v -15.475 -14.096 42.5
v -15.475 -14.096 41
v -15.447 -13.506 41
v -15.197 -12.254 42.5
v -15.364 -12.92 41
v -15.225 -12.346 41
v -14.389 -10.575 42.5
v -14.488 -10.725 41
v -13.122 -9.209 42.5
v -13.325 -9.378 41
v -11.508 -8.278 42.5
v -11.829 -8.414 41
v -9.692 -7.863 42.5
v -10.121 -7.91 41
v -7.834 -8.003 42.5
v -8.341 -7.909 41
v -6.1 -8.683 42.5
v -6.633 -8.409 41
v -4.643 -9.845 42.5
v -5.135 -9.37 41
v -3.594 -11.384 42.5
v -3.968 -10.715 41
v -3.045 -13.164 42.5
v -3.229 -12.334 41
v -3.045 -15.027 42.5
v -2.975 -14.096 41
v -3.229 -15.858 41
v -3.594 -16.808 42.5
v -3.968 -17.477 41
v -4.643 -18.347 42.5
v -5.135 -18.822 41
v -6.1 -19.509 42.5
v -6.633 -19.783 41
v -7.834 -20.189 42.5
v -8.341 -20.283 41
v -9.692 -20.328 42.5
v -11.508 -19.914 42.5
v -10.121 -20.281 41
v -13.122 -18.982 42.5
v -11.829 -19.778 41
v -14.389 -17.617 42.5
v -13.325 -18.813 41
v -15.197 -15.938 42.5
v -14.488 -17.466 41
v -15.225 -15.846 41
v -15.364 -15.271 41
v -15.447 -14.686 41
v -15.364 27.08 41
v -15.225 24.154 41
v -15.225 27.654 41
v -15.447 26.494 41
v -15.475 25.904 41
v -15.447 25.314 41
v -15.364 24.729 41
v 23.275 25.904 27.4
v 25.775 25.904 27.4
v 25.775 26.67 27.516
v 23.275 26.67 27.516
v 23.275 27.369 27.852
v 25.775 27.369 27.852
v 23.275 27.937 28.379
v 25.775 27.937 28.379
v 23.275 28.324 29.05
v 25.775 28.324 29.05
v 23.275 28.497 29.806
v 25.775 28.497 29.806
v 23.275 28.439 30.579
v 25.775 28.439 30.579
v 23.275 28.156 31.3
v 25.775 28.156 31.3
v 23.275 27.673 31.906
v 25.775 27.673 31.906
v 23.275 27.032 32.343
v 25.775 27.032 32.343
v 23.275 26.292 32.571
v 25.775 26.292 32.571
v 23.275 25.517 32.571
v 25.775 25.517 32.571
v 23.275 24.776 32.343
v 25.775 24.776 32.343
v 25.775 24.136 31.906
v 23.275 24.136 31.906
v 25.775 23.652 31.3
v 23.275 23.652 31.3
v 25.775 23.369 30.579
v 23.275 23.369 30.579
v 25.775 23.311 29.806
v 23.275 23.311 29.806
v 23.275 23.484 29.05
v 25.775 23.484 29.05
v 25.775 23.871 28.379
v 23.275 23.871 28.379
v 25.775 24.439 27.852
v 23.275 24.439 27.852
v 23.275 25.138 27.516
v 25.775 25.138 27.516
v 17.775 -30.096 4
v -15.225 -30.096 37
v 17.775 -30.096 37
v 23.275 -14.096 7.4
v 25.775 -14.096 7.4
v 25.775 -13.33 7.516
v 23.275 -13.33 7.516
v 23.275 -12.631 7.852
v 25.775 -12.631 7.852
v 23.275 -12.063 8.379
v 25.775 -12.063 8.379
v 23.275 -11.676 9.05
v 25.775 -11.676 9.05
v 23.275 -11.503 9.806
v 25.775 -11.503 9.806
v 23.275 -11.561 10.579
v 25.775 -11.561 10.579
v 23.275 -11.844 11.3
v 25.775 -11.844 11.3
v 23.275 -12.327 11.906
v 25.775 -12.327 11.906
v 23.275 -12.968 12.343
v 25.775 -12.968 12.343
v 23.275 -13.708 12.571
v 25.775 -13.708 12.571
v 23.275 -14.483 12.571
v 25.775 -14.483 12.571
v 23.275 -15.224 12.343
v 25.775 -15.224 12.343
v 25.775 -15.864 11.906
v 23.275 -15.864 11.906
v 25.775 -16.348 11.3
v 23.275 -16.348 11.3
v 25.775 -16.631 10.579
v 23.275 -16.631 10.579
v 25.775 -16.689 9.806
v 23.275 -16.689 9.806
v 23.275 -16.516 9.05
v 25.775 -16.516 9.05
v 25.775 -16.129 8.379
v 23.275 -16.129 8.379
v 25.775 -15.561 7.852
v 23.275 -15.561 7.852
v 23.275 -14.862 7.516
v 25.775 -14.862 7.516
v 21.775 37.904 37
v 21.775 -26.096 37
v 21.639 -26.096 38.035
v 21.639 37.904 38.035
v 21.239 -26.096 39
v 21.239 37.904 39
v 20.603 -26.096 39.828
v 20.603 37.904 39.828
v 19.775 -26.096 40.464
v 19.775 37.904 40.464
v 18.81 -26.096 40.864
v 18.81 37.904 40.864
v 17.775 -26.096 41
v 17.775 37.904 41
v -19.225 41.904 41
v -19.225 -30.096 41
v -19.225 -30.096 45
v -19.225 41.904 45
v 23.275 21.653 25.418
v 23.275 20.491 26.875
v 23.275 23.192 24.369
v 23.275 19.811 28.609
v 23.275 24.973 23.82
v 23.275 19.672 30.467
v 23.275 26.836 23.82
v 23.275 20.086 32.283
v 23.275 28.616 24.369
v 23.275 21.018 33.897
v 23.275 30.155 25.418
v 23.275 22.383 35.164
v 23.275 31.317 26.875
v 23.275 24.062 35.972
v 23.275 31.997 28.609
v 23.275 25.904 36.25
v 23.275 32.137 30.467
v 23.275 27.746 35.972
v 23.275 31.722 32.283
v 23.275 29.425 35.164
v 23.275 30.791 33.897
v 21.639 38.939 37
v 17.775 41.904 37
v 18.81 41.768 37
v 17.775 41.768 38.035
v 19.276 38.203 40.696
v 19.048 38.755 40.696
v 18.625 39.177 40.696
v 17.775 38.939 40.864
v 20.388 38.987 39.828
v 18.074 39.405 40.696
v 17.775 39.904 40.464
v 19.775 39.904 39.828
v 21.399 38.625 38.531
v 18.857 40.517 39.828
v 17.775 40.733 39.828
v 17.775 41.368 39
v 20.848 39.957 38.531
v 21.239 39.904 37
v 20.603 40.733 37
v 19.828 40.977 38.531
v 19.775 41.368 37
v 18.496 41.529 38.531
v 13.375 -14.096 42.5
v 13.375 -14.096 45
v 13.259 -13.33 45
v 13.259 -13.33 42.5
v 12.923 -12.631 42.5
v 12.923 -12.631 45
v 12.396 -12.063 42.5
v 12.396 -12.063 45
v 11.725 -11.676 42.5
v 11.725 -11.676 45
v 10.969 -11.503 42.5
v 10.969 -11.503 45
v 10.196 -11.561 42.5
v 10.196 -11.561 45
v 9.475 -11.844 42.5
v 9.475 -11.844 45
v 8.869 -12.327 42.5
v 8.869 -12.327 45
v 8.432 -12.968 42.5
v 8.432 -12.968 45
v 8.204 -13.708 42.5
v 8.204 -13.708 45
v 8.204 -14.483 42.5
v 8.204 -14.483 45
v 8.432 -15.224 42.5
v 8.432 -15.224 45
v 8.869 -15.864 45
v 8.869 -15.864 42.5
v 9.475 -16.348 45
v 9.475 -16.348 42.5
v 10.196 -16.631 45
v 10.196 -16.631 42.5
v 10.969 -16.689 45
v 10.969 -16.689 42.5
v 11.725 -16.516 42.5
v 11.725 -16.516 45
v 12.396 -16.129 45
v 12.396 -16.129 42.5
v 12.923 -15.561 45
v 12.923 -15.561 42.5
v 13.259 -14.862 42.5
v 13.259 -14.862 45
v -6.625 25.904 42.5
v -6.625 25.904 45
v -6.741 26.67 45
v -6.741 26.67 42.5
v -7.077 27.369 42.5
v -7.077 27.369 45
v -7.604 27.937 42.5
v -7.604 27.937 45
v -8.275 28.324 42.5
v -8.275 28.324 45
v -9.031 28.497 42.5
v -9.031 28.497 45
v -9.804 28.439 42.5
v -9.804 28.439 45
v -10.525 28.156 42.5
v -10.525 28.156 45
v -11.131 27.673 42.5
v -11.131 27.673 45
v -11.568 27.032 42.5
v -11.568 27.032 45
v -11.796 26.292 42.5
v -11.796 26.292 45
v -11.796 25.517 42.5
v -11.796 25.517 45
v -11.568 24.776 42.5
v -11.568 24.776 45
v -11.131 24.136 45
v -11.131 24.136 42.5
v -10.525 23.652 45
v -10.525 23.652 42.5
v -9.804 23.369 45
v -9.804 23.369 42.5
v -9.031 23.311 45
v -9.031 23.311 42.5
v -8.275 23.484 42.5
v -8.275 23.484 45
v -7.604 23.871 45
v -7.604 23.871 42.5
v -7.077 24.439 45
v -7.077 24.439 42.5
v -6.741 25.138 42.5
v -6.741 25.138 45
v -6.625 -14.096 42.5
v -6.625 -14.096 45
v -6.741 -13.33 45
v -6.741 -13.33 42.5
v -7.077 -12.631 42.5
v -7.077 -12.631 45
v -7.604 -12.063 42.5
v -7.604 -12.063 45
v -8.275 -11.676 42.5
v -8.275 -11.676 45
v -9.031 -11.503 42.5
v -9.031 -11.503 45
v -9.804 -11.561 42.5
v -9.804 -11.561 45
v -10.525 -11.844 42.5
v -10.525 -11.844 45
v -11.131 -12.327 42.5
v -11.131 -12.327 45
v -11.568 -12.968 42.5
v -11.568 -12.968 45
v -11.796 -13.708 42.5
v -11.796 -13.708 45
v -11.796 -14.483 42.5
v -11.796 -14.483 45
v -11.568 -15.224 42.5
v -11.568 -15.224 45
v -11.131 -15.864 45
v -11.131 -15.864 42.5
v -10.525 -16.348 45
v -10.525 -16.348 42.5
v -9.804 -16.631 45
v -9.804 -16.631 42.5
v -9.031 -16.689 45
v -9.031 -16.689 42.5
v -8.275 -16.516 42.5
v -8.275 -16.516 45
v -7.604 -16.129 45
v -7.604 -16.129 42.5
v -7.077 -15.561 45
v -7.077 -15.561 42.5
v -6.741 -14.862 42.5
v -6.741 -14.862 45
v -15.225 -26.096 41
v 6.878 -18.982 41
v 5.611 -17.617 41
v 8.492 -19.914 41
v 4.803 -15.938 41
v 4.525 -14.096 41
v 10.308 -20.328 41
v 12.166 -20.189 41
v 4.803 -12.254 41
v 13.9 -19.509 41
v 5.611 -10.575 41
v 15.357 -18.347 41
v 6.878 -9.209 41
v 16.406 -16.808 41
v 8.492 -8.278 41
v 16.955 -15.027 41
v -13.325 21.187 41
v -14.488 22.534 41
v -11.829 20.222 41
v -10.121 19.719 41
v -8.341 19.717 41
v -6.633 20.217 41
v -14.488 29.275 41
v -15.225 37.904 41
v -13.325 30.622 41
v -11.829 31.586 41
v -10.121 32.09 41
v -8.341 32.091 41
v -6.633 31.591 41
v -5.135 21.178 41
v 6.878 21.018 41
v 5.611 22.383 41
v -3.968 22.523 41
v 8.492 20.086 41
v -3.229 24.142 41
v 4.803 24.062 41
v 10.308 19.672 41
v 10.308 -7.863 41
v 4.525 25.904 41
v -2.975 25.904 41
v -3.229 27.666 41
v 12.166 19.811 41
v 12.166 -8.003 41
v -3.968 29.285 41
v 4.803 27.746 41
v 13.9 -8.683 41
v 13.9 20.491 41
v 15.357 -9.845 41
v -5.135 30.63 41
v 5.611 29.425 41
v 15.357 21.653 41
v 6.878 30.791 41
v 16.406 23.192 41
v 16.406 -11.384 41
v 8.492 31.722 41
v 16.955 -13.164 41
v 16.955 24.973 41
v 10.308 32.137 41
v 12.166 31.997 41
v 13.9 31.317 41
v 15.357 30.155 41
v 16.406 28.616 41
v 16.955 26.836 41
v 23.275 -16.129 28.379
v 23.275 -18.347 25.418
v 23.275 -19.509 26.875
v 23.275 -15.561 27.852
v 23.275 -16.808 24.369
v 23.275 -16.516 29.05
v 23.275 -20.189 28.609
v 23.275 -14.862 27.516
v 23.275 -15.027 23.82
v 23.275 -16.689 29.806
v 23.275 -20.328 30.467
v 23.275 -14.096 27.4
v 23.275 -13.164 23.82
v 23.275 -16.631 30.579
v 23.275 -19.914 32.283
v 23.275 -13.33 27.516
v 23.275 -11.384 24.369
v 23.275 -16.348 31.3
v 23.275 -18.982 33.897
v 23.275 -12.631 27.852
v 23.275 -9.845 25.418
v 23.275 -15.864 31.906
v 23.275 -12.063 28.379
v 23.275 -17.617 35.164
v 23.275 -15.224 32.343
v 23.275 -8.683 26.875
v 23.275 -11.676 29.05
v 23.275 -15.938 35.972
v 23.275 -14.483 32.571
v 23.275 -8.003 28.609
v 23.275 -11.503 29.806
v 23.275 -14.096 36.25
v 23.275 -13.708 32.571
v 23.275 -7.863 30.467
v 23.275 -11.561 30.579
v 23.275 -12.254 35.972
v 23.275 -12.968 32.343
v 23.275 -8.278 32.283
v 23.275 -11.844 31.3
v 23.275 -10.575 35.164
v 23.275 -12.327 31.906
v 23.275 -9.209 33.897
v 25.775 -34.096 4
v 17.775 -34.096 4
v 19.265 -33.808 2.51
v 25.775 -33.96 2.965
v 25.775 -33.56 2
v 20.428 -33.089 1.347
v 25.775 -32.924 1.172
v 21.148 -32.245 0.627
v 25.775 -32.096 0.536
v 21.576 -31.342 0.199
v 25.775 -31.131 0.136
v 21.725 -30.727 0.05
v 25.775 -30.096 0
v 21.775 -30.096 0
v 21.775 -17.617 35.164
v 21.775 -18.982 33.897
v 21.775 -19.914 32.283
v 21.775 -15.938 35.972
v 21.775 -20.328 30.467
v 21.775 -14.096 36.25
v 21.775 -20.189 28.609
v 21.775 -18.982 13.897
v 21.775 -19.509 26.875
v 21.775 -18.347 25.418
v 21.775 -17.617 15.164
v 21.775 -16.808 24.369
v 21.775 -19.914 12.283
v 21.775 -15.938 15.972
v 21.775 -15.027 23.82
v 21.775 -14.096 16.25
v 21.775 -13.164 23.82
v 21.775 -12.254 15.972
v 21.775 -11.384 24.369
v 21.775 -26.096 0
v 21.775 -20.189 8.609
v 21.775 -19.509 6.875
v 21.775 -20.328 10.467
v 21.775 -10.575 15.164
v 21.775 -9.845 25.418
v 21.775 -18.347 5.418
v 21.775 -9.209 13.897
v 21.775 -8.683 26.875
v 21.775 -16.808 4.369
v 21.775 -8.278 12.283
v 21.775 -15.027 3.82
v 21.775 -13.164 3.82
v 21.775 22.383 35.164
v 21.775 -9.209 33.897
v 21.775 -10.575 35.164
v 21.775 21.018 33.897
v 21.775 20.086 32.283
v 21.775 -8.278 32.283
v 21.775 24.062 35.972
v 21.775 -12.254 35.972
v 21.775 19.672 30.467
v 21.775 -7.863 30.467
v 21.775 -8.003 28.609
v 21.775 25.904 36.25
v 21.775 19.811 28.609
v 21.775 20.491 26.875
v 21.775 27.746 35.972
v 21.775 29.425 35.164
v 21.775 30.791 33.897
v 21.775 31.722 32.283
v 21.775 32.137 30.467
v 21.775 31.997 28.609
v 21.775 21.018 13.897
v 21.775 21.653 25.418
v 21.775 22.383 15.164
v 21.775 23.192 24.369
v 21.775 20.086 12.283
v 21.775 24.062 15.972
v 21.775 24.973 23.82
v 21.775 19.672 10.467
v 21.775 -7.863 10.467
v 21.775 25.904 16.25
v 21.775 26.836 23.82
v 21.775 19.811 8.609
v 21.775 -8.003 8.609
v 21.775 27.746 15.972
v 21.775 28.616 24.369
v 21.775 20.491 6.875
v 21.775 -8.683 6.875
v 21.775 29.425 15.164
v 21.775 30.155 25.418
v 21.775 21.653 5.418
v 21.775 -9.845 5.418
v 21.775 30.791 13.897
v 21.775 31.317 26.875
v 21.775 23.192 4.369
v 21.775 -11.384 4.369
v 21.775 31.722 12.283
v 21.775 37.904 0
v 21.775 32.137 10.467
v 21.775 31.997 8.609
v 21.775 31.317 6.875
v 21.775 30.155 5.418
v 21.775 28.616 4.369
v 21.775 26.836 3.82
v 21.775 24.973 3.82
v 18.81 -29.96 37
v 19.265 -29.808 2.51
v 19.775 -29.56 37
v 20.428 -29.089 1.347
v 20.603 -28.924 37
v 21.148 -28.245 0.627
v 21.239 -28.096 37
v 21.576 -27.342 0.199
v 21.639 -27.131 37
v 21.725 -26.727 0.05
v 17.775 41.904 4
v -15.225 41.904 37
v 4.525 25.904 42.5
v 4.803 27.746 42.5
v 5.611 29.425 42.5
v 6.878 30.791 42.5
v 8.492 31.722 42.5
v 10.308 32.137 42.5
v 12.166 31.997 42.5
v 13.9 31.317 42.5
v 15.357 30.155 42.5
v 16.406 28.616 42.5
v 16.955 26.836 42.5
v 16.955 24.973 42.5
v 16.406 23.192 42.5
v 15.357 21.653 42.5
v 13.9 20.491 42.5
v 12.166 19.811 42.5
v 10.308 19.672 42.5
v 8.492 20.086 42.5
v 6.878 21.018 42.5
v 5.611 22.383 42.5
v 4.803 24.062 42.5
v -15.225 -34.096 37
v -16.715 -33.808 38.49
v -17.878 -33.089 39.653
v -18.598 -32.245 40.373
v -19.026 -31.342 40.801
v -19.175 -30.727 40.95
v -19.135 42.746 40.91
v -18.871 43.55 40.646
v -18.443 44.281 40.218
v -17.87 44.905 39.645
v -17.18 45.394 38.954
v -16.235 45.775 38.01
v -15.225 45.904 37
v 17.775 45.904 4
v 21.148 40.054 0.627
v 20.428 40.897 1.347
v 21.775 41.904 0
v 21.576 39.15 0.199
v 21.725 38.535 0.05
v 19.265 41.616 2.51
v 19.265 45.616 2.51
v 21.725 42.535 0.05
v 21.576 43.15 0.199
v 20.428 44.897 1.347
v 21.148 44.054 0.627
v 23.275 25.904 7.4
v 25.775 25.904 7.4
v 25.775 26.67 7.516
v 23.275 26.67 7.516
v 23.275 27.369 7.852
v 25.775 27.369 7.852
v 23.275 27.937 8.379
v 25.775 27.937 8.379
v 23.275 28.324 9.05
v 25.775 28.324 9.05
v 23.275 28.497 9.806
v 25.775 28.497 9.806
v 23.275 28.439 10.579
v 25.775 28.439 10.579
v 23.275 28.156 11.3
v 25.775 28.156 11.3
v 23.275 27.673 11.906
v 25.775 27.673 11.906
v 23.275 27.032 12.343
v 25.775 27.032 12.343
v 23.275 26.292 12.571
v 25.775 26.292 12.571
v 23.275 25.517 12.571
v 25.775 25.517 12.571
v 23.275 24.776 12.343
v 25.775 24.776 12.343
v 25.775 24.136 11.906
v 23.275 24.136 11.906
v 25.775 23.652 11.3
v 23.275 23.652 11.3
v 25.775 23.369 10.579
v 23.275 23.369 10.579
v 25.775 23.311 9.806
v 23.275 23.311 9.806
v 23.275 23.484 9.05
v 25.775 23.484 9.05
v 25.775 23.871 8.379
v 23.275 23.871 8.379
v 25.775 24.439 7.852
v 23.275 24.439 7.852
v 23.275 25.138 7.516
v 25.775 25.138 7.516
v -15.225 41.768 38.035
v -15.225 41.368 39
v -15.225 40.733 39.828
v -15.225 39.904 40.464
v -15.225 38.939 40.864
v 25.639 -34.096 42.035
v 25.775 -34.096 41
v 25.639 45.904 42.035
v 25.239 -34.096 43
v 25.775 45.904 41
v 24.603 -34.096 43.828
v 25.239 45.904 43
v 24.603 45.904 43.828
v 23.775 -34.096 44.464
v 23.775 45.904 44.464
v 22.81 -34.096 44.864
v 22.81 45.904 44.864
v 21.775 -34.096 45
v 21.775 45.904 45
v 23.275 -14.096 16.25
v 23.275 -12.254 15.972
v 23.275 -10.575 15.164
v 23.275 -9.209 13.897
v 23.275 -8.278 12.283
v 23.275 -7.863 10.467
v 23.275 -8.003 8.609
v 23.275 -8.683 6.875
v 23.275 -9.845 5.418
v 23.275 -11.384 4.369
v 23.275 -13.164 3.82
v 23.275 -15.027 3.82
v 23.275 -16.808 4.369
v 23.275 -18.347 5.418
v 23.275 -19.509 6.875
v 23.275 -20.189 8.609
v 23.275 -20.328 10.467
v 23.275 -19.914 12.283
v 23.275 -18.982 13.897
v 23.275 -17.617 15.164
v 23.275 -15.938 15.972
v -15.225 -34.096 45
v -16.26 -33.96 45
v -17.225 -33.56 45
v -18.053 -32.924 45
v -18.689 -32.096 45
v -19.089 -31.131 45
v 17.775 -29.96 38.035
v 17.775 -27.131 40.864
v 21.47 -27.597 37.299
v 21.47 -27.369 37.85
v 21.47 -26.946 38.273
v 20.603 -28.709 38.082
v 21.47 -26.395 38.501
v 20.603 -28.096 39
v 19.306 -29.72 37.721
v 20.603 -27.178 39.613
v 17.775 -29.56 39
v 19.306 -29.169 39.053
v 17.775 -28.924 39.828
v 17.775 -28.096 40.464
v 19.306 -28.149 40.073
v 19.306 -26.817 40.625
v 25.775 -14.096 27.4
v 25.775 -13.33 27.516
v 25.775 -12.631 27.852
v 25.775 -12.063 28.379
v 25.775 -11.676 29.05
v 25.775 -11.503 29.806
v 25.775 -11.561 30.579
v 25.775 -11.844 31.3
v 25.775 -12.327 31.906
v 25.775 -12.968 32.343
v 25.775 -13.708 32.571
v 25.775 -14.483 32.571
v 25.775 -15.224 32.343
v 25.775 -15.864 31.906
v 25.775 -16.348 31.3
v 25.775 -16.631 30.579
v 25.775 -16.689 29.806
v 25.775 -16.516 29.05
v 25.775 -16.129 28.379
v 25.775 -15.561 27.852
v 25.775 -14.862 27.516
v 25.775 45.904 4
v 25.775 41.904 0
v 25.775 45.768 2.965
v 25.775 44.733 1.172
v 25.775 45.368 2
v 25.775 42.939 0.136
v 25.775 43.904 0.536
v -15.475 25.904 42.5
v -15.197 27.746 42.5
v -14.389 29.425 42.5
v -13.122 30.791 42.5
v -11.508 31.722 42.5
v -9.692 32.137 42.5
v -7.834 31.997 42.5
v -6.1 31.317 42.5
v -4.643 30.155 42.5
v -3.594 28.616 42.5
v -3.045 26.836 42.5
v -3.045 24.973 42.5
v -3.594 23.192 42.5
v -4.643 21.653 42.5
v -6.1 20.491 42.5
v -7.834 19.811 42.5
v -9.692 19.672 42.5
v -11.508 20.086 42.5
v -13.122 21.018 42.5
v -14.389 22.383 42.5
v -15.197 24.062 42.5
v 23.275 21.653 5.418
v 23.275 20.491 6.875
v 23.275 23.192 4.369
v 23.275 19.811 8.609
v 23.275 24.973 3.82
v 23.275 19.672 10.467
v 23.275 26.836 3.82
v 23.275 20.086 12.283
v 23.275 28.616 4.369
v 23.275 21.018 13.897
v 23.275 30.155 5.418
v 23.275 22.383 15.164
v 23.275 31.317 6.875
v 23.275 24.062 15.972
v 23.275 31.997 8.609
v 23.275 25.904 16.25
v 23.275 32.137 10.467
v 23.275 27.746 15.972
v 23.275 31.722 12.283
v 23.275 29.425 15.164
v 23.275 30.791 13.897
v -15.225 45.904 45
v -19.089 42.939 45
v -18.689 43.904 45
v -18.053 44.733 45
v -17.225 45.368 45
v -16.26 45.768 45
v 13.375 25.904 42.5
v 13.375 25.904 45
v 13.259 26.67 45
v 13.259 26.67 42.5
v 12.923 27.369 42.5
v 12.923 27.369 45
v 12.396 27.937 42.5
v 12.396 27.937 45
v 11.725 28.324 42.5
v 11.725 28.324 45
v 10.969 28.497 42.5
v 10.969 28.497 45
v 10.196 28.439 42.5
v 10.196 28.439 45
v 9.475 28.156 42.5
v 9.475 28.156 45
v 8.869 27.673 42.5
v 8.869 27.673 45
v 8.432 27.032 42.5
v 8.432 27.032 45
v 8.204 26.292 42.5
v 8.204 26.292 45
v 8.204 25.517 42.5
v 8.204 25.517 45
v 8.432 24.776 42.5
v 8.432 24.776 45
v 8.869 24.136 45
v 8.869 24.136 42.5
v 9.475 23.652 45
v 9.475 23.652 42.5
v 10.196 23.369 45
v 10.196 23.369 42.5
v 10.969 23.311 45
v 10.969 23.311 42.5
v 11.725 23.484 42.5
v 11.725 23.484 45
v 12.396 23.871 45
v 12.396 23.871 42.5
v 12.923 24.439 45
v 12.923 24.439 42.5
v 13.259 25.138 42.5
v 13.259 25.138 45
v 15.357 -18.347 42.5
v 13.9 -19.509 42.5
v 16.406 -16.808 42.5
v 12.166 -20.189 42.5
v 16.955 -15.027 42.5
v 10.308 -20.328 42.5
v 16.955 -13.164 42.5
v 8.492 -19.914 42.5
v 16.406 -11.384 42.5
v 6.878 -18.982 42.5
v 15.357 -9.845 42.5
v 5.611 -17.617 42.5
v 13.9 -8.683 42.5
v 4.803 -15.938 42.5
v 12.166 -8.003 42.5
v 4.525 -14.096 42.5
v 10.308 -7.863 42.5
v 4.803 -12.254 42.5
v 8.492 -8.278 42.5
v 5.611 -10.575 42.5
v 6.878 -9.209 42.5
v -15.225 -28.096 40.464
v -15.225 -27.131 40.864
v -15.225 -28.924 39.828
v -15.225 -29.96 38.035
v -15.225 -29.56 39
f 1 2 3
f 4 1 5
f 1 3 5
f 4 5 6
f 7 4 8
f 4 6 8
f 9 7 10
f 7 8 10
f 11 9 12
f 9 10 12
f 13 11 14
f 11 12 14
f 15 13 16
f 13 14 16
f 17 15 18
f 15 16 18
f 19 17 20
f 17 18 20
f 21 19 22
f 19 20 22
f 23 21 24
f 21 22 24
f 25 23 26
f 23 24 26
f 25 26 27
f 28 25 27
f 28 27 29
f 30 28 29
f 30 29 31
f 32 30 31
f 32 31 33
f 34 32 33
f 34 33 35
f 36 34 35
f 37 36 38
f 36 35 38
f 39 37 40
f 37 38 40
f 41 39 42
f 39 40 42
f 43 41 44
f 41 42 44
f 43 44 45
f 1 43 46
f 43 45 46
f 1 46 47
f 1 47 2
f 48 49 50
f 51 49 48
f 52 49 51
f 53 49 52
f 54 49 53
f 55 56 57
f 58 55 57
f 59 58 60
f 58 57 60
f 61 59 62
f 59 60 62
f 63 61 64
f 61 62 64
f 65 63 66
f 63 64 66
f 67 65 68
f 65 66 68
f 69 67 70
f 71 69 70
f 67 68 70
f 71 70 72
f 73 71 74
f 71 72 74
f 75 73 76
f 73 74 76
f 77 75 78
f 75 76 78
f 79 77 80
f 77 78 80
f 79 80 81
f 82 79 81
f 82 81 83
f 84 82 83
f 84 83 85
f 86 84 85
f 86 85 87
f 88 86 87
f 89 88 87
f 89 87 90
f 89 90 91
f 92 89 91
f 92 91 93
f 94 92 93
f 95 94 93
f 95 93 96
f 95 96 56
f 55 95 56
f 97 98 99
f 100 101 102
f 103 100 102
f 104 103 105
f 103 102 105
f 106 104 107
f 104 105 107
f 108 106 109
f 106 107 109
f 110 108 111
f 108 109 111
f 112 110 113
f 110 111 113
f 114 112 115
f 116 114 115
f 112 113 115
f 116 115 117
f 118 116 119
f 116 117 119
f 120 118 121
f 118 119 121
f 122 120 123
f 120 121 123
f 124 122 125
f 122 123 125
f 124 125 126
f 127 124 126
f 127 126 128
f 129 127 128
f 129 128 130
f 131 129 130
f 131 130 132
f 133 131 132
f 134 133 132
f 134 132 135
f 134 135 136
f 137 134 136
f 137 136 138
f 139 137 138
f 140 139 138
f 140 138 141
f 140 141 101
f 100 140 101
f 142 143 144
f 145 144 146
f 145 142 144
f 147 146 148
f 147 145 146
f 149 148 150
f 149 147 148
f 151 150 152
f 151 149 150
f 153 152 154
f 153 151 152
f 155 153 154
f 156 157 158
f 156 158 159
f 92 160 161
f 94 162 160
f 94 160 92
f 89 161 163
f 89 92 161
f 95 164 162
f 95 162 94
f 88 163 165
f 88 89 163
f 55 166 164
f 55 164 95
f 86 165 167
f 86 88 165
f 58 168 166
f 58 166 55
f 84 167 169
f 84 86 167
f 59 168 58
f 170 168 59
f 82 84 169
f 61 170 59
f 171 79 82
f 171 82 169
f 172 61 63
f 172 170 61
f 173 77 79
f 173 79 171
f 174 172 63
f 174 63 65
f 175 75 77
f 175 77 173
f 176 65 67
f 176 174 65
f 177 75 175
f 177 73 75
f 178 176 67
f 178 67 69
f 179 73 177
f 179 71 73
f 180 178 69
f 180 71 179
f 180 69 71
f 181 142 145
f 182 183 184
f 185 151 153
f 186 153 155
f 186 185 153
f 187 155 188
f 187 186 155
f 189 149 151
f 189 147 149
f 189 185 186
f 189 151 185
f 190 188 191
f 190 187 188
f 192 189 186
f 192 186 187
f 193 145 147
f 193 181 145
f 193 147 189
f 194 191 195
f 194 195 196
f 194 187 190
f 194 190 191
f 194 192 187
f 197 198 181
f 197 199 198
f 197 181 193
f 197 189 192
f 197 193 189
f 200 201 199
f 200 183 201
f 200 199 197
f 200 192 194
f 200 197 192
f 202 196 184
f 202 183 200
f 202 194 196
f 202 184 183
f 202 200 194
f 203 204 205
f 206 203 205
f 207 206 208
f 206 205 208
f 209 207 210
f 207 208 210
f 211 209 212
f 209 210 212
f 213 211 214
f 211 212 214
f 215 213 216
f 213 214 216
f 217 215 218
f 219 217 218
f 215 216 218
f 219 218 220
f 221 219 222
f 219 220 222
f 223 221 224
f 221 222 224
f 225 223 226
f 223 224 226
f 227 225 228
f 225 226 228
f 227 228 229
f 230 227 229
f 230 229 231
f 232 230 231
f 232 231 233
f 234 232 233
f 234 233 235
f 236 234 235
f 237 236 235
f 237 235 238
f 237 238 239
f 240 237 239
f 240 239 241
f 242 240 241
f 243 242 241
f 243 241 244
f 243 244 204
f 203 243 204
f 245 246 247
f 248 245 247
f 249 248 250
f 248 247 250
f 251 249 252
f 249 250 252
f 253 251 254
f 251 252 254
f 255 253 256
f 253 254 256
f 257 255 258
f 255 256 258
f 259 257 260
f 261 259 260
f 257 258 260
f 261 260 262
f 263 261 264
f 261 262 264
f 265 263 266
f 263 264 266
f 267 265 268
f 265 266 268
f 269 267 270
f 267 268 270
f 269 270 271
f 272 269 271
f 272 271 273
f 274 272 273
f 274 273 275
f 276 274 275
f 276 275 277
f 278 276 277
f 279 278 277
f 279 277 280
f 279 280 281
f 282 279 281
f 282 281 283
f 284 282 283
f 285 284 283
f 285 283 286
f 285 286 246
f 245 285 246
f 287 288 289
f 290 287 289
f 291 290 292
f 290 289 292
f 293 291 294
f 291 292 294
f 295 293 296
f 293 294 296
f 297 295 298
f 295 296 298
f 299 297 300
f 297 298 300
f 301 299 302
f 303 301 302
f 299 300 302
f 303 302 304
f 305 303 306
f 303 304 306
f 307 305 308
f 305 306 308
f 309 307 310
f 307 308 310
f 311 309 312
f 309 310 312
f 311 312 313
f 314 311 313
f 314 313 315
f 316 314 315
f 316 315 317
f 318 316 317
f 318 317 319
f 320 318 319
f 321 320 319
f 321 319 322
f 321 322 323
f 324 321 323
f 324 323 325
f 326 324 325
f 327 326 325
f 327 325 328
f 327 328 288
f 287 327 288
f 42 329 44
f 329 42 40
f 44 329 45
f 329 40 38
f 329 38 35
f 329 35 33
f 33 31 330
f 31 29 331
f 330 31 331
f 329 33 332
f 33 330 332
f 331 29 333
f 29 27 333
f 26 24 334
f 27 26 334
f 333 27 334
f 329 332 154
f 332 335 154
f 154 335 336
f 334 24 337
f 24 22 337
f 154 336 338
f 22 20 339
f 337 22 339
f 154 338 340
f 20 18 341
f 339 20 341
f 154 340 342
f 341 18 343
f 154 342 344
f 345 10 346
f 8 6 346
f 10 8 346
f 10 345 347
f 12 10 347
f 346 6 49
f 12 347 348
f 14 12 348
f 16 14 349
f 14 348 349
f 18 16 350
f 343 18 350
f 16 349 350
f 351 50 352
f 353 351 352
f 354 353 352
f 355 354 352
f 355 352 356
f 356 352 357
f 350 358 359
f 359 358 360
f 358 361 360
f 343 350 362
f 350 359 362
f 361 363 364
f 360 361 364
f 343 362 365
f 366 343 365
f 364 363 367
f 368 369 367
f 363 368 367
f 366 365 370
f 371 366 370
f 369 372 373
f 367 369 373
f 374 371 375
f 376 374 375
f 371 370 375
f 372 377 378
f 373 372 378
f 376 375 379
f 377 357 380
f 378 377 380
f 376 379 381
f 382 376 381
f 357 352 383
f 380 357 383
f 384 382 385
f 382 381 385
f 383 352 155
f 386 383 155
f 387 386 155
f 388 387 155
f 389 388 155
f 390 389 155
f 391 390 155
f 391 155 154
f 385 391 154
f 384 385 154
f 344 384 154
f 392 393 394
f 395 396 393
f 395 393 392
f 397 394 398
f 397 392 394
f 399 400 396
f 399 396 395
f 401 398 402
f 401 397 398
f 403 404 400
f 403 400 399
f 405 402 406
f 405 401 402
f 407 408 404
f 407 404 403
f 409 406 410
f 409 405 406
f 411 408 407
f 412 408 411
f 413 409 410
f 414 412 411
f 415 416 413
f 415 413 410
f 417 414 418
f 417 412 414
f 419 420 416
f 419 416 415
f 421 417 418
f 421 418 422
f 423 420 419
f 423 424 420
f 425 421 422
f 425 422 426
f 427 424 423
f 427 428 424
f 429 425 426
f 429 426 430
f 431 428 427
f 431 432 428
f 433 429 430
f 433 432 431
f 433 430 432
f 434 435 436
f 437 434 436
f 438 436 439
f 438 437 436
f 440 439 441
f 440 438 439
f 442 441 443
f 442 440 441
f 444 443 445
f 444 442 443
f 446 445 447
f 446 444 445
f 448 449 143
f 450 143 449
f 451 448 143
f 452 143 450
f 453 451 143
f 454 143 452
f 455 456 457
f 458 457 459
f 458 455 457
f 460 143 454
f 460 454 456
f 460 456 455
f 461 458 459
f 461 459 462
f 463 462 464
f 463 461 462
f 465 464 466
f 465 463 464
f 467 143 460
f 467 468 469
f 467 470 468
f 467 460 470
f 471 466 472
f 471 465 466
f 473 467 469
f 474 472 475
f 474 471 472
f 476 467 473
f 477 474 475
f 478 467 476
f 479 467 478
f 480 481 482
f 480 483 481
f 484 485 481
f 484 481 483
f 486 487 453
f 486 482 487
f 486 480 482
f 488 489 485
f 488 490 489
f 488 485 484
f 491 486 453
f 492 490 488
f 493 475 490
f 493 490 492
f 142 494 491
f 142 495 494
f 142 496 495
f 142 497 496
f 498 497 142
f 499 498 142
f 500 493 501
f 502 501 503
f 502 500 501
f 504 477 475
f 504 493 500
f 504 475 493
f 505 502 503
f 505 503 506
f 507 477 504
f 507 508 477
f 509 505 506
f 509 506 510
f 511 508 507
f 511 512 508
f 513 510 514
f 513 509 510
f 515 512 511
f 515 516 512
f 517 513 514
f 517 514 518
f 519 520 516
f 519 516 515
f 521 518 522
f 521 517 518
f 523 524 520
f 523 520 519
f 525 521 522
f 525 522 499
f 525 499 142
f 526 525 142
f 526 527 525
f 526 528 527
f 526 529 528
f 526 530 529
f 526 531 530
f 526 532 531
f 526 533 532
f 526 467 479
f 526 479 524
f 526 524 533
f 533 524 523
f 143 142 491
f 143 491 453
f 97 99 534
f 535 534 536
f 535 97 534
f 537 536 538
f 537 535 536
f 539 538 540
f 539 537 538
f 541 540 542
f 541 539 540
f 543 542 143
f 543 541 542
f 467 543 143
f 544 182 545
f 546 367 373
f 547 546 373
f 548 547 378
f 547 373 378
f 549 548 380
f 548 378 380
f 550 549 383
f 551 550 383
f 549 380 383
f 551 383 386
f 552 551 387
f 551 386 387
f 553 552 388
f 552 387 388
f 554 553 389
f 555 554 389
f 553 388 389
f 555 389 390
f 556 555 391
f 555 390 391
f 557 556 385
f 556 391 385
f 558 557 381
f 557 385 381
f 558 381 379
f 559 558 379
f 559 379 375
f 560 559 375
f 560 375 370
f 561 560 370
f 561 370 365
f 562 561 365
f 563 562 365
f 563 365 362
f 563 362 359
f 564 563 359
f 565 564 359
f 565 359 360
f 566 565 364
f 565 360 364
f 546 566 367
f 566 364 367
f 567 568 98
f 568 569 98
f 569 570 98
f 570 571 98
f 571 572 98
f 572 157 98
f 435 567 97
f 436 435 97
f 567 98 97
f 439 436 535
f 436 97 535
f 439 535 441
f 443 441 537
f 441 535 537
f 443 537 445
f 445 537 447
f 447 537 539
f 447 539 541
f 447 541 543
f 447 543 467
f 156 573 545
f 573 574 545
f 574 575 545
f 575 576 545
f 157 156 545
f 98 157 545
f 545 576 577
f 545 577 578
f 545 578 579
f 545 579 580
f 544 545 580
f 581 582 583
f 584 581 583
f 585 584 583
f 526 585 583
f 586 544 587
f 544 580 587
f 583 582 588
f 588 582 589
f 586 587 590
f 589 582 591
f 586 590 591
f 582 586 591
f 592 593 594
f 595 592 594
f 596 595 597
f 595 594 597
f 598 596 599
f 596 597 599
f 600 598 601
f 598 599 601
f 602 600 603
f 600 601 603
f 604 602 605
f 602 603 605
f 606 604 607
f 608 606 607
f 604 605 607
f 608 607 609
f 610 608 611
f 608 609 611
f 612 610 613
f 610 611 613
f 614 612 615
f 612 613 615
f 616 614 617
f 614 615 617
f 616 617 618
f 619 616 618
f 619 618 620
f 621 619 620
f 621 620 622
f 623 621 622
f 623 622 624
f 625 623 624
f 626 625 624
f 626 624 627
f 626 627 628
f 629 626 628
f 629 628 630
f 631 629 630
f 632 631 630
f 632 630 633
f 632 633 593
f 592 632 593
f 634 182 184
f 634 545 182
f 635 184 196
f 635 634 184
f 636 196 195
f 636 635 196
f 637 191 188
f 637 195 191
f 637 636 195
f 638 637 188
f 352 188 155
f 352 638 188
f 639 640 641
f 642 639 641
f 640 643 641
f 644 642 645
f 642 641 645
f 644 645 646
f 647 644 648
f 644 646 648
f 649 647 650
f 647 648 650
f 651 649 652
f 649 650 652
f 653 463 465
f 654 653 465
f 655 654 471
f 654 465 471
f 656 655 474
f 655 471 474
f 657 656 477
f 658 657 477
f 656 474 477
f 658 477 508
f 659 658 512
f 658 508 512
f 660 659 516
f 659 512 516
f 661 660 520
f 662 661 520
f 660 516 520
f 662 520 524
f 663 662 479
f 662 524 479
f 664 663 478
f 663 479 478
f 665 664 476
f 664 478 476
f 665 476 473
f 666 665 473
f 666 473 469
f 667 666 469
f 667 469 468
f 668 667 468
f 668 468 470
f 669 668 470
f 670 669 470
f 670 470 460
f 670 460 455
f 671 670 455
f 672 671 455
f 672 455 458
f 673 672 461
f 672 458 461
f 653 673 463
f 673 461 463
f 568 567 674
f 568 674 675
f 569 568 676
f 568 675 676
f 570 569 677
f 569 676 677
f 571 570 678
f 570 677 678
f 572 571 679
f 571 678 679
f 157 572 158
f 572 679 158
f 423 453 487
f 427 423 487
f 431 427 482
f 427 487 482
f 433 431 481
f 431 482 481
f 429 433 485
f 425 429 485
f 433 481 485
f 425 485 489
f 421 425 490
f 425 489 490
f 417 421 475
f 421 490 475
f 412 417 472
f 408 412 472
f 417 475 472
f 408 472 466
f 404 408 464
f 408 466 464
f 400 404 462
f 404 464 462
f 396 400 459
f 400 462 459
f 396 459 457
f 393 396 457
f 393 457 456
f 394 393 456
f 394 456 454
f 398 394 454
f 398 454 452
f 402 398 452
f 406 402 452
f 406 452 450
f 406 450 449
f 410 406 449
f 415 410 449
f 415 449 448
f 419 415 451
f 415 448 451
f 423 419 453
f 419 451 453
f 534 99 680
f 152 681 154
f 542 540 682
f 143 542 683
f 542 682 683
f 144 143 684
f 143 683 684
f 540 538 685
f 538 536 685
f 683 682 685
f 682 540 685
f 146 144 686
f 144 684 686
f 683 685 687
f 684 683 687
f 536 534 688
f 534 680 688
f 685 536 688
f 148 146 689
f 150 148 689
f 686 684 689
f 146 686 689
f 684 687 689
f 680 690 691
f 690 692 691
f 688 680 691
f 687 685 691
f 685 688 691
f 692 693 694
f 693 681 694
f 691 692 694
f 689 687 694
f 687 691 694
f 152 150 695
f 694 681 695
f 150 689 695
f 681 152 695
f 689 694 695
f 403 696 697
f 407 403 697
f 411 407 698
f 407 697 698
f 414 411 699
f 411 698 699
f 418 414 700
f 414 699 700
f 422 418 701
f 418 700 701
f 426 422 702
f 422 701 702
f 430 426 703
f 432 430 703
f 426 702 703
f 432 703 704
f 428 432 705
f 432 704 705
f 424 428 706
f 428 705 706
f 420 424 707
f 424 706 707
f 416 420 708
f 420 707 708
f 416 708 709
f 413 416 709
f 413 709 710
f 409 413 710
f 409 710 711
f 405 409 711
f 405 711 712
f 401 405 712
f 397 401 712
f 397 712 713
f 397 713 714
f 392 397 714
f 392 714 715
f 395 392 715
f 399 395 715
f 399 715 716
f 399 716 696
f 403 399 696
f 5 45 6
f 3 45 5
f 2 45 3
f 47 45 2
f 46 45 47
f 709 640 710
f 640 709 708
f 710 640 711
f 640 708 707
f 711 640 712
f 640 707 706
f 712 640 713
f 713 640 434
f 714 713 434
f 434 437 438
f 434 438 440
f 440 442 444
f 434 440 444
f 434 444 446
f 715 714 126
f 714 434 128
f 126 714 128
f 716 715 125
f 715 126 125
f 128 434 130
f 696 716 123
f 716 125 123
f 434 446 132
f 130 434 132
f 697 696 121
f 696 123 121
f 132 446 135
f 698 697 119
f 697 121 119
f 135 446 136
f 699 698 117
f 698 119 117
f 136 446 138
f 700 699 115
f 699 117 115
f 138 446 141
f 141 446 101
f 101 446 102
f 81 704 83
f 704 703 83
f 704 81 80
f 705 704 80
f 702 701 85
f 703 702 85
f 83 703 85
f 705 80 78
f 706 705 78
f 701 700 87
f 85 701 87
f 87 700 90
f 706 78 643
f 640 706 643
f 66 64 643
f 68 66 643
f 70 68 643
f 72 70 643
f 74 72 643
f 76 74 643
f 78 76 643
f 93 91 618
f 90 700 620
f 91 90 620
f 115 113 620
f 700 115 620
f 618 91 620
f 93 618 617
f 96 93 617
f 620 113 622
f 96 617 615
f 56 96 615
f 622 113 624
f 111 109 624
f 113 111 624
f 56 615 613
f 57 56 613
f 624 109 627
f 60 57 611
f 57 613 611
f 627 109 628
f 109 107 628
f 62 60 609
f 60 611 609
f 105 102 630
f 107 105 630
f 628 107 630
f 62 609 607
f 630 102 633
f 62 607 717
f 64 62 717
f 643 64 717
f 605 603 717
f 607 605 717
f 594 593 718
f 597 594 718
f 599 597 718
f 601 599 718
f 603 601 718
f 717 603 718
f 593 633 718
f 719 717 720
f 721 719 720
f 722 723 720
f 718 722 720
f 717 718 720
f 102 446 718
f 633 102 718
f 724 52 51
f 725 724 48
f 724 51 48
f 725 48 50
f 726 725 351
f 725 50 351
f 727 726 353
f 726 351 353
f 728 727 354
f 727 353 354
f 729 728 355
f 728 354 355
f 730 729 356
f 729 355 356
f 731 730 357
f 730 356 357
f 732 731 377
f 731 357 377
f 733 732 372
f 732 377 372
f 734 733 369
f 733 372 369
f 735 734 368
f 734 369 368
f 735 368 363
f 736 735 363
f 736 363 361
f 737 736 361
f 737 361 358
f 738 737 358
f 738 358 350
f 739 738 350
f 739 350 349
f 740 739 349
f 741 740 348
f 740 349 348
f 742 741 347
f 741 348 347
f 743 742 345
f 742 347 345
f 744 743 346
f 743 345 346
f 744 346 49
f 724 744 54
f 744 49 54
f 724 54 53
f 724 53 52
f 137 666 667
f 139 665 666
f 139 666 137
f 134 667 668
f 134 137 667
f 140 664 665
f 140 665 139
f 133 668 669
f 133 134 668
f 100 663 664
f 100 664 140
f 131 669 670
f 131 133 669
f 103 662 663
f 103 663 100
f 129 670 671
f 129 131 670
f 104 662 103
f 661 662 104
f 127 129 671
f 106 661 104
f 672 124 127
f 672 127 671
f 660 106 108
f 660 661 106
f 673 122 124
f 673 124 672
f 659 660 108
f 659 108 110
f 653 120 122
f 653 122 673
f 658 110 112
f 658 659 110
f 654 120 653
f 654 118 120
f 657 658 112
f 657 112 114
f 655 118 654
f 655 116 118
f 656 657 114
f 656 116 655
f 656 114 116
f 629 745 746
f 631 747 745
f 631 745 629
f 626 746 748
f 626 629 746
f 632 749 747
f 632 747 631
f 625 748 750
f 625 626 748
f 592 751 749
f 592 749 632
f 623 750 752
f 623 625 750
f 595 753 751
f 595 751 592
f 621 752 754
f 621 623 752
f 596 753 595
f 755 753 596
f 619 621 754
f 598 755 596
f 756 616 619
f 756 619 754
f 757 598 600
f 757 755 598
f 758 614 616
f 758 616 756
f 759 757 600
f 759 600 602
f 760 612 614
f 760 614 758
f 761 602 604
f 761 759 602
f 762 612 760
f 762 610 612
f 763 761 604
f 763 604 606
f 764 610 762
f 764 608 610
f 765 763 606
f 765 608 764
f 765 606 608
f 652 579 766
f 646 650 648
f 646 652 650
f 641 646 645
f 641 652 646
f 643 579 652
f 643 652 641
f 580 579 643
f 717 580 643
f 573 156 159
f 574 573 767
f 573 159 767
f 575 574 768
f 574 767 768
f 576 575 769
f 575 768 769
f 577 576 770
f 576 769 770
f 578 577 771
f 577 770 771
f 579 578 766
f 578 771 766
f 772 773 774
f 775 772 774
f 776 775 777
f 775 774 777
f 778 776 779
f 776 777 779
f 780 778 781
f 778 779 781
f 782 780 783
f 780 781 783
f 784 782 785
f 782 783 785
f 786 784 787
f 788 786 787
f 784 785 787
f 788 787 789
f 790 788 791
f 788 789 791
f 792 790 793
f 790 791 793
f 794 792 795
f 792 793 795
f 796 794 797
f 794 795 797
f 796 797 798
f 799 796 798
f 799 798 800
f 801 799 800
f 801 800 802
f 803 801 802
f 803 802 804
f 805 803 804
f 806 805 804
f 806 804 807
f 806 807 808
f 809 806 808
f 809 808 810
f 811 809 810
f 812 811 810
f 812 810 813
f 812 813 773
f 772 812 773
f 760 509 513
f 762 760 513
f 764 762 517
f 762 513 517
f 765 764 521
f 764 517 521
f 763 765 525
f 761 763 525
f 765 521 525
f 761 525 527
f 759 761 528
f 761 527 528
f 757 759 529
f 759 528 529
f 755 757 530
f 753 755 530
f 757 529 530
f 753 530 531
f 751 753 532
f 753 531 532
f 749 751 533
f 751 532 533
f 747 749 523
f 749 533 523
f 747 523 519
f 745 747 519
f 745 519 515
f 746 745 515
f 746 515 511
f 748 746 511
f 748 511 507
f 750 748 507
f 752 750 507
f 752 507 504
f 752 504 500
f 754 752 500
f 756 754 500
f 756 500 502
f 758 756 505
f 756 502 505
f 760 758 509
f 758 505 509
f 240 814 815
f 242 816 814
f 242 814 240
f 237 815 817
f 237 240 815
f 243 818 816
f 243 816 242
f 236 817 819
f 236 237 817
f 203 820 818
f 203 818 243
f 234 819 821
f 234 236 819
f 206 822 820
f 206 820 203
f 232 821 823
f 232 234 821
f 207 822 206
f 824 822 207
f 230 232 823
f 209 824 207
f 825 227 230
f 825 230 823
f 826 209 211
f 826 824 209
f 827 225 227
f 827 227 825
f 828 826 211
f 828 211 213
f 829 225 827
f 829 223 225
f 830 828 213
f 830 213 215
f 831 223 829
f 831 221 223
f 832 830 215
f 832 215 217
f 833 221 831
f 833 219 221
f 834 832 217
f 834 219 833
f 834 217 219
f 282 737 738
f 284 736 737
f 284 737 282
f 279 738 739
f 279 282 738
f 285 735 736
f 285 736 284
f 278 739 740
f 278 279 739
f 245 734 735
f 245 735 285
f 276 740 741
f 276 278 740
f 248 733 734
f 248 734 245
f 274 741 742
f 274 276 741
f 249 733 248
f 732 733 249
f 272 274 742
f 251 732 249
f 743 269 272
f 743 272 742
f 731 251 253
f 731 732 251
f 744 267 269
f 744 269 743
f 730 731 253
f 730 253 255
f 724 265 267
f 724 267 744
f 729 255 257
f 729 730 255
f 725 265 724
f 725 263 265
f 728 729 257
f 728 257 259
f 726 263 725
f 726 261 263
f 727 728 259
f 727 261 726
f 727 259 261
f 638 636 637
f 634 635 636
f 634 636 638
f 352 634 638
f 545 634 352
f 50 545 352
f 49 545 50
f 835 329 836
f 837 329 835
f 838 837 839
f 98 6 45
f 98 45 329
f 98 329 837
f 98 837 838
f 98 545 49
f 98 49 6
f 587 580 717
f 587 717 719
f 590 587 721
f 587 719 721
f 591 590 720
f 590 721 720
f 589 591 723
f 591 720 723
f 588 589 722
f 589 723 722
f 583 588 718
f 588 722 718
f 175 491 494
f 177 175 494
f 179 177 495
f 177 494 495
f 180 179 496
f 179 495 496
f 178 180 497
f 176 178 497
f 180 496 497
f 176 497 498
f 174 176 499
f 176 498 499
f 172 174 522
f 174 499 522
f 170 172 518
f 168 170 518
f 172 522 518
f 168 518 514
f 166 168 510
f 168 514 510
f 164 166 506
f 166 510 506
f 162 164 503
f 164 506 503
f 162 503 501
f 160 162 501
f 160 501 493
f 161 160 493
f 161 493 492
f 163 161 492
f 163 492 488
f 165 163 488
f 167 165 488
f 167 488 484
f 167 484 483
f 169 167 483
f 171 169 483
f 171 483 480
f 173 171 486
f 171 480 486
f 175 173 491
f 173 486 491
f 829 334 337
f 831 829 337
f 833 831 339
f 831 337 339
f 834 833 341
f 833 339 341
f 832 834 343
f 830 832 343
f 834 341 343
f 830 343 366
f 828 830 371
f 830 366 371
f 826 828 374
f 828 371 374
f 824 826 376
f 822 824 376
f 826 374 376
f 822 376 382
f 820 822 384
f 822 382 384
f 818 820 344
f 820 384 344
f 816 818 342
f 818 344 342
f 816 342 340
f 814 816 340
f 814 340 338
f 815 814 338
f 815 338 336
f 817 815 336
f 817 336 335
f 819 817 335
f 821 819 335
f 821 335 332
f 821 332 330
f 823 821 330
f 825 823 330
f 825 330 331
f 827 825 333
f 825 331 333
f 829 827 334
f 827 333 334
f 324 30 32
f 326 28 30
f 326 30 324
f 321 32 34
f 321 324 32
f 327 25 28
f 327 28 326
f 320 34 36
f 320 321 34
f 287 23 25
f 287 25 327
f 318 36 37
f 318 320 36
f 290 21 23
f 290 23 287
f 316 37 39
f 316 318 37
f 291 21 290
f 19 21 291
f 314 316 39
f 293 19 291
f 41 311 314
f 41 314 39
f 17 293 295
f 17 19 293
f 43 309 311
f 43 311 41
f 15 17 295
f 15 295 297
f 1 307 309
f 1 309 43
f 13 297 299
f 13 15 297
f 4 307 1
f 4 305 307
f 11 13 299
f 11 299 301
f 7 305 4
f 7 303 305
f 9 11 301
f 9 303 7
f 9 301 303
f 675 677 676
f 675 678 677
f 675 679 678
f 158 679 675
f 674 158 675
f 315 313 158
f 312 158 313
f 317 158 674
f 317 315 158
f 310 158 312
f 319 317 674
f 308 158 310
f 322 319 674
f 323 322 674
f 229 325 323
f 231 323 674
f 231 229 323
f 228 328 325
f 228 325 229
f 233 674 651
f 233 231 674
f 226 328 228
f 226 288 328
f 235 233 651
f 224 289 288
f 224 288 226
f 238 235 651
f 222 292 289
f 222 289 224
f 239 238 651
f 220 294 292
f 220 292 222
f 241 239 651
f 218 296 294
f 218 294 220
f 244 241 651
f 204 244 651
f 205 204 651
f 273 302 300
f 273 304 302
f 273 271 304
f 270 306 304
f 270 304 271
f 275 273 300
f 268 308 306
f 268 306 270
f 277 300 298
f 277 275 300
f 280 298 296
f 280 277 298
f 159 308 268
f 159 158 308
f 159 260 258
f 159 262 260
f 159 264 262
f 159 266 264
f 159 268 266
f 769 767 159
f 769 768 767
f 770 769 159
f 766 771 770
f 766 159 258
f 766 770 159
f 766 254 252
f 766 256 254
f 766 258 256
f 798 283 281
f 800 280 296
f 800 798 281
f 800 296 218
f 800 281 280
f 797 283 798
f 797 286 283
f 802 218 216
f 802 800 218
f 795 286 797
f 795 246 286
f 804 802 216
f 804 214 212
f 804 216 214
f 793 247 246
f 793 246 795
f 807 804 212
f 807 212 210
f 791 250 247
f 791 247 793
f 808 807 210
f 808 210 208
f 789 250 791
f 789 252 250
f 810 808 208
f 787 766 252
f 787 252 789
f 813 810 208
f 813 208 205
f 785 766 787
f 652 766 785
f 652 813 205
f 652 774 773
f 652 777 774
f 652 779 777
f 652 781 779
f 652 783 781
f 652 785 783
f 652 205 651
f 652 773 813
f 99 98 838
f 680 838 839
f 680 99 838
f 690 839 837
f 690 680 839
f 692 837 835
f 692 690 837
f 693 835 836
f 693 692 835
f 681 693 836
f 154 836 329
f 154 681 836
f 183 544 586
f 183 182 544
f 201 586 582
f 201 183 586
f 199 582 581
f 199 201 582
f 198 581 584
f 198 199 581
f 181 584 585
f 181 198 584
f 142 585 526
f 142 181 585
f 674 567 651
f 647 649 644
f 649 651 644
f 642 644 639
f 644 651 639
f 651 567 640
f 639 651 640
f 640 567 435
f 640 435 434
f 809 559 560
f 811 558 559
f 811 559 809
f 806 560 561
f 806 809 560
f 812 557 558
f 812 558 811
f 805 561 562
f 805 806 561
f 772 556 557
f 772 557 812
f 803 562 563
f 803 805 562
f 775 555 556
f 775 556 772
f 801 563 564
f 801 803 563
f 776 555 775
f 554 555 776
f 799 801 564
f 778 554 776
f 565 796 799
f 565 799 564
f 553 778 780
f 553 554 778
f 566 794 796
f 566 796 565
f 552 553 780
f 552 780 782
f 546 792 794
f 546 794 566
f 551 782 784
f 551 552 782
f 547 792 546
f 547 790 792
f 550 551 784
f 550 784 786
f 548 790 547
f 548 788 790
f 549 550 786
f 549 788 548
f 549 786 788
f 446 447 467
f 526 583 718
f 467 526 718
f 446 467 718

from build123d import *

# Parameters (mm, degrees)
SKETCH1_W           = 45
SKETCH1_H           = 80
BOSS_EXTRUDE1_DEPTH = 45
SKETCH3_R           = 2.6
CUT_EXTRUDE1_DEPTH  = 40
SHELL1_OUTLINE_R    = 6.6
SHELL1_DEPTH        = 41
SHELL1_2_OUTLINE_R  = 6.6
SHELL1_2_DEPTH      = 1
CUT_EXTRUDE2_DEPTH  = 96.338073399
SKETCH5_W           = 37
SKETCH5_H           = 72
CUT_EXTRUDE3_DEPTH  = 40
SKETCH6_R           = 2.6
CUT_EXTRUDE4_DEPTH  = 40
FILLET1_R           = 4
FILLET2_R           = 4
FILLET3_R           = 4
SKETCH8_R           = 6.25
CUT_EXTRUDE5_DEPTH  = 1.5
SKETCH7_R           = 6.25
CUT_EXTRUDE6_DEPTH  = 1.5


# Read off the part's stored shape, not the designer's step: Shell1
with BuildPart() as part:
    # Sketch1 → Boss-Extrude1 (new body)
    with BuildSketch(Plane.XY):
        with Locations((3.274953722, 5.904112676)):
            Rectangle(SKETCH1_W, SKETCH1_H)
    extrude(amount=BOSS_EXTRUDE1_DEPTH)

    # Sketch3 → Cut-Extrude1 (cut)
    with BuildSketch(Plane(origin=(0, 0, 45), x_dir=(-1, 0, 0), z_dir=(0, 0, 1))):
        with Locations(Location((-10.774953722, -25.904112676, 0), (0, 0, 180))):
            Circle(SKETCH3_R)
        with Locations(Location((-10.774953722, 14.095887324, 0), (0, 0, 180))):
            Circle(SKETCH3_R)
        with Locations(Location((9.225046278, 14.095887324, 0), (0, 0, 180))):
            Circle(SKETCH3_R)
        with Locations(Location((9.225046278, -25.904112676, 0), (0, 0, 180))):
            Circle(SKETCH3_R)
    extrude(amount=-CUT_EXTRUDE1_DEPTH, mode=Mode.SUBTRACT)

    # Shell1 outline → Shell1 (cut)
    with BuildSketch(Plane.XY):
        with BuildLine():
            Line((-15.225046278, -16.845432741), (-15.225046278, -30.095887324))
            Line((-15.225046278, -30.095887324), (21.774953722, -30.095887324))
            Line((21.774953722, -30.095887324), (21.774953722, 41.904112676))
            Line((21.774953722, 41.904112676), (-15.225046278, 41.904112676))
            Line((-15.225046278, 41.904112676), (-15.225046278, 28.653658093))
            ThreePointArc((-15.225046278, 28.653658093), (-2.625046278, 25.904112676), (-15.225046278, 23.154567259))
            Line((-15.225046278, 23.154567259), (-15.225046278, -11.346341907))
            ThreePointArc((-15.225046278, -11.346341907), (-2.625046278, -14.095887324), (-15.225046278, -16.845432741))
        make_face()
        with Locations((10.774953722, -14.095887324)):
            Circle(SHELL1_OUTLINE_R, mode=Mode.SUBTRACT)
        with Locations((10.774953722, 25.904112676)):
            Circle(SHELL1_OUTLINE_R, mode=Mode.SUBTRACT)
    extrude(amount=SHELL1_DEPTH, mode=Mode.SUBTRACT)

    # Shell1 2 outline → Shell1 2 (cut)
    with BuildSketch(Plane.XY):
        with BuildLine():
            Line((-15.225046278, -11.346341907), (-15.225046278, -16.845432741))
            ThreePointArc((-15.225046278, -16.845432741), (-2.625046278, -14.095887324), (-15.225046278, -11.346341907))
        make_face()
        with BuildLine():
            Line((-15.225046278, 28.653658093), (-15.225046278, 23.154567259))
            ThreePointArc((-15.225046278, 23.154567259), (-2.625046278, 25.904112676), (-15.225046278, 28.653658093))
        make_face()
        with Locations((10.774953722, -14.095887324)):
            Circle(SHELL1_2_OUTLINE_R)
        with Locations((10.774953722, 25.904112676)):
            Circle(SHELL1_2_OUTLINE_R)
    extrude(amount=SHELL1_2_DEPTH, mode=Mode.SUBTRACT)

    # Sketch4 → Cut-Extrude2 (cut, through all)
    with BuildSketch(Plane(origin=(0, 45.904112676, 0), x_dir=(1, 0, 0), z_dir=(0, 1, 0))):
        Polygon((-19.225046278, 0), (-19.225046278, -41), (21.774953722, 0), align=None)
    extrude(amount=-CUT_EXTRUDE2_DEPTH, mode=Mode.SUBTRACT)

    # Sketch5 → Cut-Extrude3 (cut)
    with BuildSketch(Plane(origin=(0, 0, 41), x_dir=(-1, 0, 0), z_dir=(0, 0, -1))):
        with Locations((-3.274953722, 5.904112676)):
            Rectangle(SKETCH5_W, SKETCH5_H)
    extrude(amount=CUT_EXTRUDE3_DEPTH, mode=Mode.SUBTRACT)

    # Sketch6 → Cut-Extrude4 (cut)
    with BuildSketch(Plane(origin=(25.774953722, 0, 0), x_dir=(0, 0, 1), z_dir=(1, 0, 0))):
        with Locations(Location((10, -25.904112676, 0), (0, 0, 180))):
            Circle(SKETCH6_R)
        with Locations(Location((10, 14.095887324, 0), (0, 0, 180))):
            Circle(SKETCH6_R)
        with Locations(Location((30, 14.095887324, 0), (0, 0, 180))):
            Circle(SKETCH6_R)
        with Locations(Location((30, -25.904112676, 0), (0, 0, 180))):
            Circle(SKETCH6_R)
    extrude(amount=-CUT_EXTRUDE4_DEPTH, mode=Mode.SUBTRACT)

    # Fillet1
    fillet1_edges = [part.edges().sort_by_distance(p)[0] for p in [
        (3.274953722, -30.095887324, 41),
        (21.774953722, -30.095887324, 20.5),
        (21.774953722, 41.904112676, 20.5),
        (21.774953722, 5.904112676, 41),
        (3.274953722, 41.904112676, 41),
    ]]
    fillet(fillet1_edges, radius=FILLET1_R)

    # Fillet2
    fillet2_edges = [part.edges().sort_by_distance(p)[0] for p in [
        (23.774953722, -34.095887324, 0),
        (23.774953722, 45.904112676, 0),
        (-19.225046278, -34.095887324, 43),
        (-19.225046278, 45.904112676, 43),
    ]]
    fillet(fillet2_edges, radius=FILLET2_R)

    # Fillet3
    fillet3_edges = [part.edges().sort_by_distance(p)[0] for p in [
        (25.774953722, 5.904112676, 45),
    ]]
    fillet(fillet3_edges, radius=FILLET3_R)

    # Sketch8 → Cut-Extrude5 (cut)
    with BuildSketch(Plane(origin=(0, 0, 41), x_dir=(-1, 0, 0), z_dir=(0, 0, -1))):
        with Locations((-10.774953722, -14.095887324)):
            Circle(SKETCH8_R)
        with Locations((-10.774953722, 25.904112676)):
            Circle(SKETCH8_R)
        with Locations((9.225046278, 25.904112676)):
            Circle(SKETCH8_R)
        with Locations((9.225046278, -14.095887324)):
            Circle(SKETCH8_R)
    extrude(amount=-CUT_EXTRUDE5_DEPTH, mode=Mode.SUBTRACT)

    # Sketch7 → Cut-Extrude6 (cut)
    with BuildSketch(Plane.ZY.offset(-21.774953722)):
        with Locations((10, 25.904112676)):
            Circle(SKETCH7_R)
        with Locations((30, 25.904112676)):
            Circle(SKETCH7_R)
        with Locations((30, -14.095887324)):
            Circle(SKETCH7_R)
        with Locations((10, -14.095887324)):
            Circle(SKETCH7_R)
    extrude(amount=-CUT_EXTRUDE6_DEPTH, mode=Mode.SUBTRACT)


solid = part.part
